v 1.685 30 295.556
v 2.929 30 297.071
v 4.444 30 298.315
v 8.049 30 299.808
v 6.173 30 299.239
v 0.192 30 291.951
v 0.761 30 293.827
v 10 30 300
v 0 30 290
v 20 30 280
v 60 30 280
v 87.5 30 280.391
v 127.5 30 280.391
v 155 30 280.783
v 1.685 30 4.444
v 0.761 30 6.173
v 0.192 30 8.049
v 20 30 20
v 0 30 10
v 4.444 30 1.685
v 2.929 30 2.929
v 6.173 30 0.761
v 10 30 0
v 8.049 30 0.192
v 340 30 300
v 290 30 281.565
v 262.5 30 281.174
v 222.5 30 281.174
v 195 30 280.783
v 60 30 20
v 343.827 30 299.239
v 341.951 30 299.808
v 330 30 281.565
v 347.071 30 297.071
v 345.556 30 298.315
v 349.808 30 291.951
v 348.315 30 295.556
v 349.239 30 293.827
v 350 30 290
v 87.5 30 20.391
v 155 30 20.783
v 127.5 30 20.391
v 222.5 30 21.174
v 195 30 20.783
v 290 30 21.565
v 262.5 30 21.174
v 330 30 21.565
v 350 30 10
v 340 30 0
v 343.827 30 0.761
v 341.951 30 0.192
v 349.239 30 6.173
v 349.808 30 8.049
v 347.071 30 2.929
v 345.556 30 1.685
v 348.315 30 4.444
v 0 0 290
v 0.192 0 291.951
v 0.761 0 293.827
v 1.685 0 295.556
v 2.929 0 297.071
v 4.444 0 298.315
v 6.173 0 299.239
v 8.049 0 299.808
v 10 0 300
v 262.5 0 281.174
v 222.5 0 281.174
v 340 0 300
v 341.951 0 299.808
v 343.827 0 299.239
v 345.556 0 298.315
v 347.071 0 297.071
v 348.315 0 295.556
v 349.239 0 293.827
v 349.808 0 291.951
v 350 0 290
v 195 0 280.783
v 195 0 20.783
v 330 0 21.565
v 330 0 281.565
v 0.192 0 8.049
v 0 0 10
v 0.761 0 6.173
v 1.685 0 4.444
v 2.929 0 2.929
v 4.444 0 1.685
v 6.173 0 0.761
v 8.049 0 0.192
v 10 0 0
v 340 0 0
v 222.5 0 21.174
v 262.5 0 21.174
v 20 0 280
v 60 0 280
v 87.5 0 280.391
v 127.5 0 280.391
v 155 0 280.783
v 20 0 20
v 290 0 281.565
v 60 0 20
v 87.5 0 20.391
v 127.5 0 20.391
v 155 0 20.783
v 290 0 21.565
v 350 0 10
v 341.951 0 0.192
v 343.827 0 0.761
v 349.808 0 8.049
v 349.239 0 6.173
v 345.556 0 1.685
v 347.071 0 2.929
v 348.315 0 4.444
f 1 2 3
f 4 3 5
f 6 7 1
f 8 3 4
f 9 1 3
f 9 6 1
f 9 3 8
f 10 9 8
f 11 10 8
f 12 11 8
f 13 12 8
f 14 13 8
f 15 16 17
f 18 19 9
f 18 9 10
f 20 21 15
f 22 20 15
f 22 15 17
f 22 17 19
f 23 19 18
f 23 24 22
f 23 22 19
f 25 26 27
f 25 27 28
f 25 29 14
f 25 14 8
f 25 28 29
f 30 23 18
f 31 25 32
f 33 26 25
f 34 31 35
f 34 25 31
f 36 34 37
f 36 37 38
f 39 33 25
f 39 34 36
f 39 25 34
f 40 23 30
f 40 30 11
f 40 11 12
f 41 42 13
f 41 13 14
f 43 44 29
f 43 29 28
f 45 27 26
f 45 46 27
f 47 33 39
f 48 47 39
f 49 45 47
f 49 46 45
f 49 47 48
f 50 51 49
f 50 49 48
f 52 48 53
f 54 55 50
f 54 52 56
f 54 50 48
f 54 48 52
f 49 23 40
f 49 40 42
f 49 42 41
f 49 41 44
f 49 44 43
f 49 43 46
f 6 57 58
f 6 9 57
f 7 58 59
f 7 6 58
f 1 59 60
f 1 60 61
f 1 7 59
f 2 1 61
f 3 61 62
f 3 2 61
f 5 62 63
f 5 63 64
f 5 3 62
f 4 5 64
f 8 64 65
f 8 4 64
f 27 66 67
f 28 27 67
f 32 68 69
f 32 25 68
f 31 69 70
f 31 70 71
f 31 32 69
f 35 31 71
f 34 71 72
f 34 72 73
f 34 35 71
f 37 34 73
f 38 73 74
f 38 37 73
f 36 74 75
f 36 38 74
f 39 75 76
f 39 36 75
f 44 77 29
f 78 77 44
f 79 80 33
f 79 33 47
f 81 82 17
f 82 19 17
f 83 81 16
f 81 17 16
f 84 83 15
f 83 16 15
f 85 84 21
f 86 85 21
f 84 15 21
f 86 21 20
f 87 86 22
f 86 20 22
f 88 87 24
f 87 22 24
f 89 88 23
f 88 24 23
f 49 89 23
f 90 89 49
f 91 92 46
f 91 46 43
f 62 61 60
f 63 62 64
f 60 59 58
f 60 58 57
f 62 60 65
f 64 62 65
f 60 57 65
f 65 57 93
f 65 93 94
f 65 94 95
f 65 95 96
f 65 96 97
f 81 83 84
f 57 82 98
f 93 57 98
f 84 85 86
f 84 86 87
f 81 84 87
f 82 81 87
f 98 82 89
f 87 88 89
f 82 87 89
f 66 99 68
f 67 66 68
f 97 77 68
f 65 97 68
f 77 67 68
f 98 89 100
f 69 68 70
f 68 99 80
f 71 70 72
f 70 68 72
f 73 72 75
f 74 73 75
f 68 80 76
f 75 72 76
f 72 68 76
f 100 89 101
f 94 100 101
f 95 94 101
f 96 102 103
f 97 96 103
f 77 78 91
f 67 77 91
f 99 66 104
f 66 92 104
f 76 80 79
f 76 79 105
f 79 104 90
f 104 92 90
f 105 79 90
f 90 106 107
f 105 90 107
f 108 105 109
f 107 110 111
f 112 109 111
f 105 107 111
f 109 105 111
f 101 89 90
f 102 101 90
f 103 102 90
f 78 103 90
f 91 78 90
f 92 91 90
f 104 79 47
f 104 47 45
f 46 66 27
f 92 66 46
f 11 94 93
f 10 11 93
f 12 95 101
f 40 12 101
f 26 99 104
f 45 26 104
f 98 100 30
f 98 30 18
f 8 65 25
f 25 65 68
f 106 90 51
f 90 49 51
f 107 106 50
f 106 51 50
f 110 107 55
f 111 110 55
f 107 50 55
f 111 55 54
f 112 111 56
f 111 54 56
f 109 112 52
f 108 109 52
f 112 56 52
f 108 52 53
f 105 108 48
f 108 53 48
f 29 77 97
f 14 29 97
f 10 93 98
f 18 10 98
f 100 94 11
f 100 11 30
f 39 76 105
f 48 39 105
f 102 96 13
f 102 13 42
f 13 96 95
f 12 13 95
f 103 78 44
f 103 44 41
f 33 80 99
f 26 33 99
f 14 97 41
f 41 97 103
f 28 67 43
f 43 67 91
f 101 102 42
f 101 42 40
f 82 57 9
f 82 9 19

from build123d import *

# Parameters (mm, degrees)
SKETCH1_W           = 350
SKETCH1_H           = 300
BOSS_EXTRUDE1_DEPTH = 30
SKETCH3_W           = 40
SKETCH3_H           = 260
CUT_EXTRUDE1_DEPTH  = 31
FILLET1_R           = 10


with BuildPart() as part:
    # Sketch1 → Boss-Extrude1 (new body)
    with BuildSketch(Plane(origin=(0, 0, 0), x_dir=(1, 0, 0), z_dir=(0, 1, 0))):
        with Locations((175, -150)):
            Rectangle(SKETCH1_W, SKETCH1_H)
    extrude(amount=BOSS_EXTRUDE1_DEPTH)

    # Sketch3 → Cut-Extrude1 (cut, through all)
    with BuildSketch(Plane(origin=(0, 0, 0), x_dir=(-1, 0, 0), z_dir=(0, -1, 0))):
        with Locations((-40, -150)):
            Rectangle(SKETCH3_W, SKETCH3_H)
        with Locations((-107.5, -150.391320706)):
            Rectangle(SKETCH3_W, SKETCH3_H)
        with Locations((-175, -150.782641412)):
            Rectangle(SKETCH3_W, SKETCH3_H)
        with Locations((-242.5, -151.173962118)):
            Rectangle(SKETCH3_W, SKETCH3_H)
        with Locations((-310, -151.565282825)):
            Rectangle(SKETCH3_W, SKETCH3_H)
    extrude(amount=-CUT_EXTRUDE1_DEPTH, mode=Mode.SUBTRACT)

    # Fillet1
    fillet1_edges = [part.edges().sort_by_distance(p)[0] for p in [
        (0, 15, 300),
        (0, 15, 0),
        (350, 15, 0),
        (350, 15, 300),
    ]]
    fillet(fillet1_edges, radius=FILLET1_R)


solid = part.part
